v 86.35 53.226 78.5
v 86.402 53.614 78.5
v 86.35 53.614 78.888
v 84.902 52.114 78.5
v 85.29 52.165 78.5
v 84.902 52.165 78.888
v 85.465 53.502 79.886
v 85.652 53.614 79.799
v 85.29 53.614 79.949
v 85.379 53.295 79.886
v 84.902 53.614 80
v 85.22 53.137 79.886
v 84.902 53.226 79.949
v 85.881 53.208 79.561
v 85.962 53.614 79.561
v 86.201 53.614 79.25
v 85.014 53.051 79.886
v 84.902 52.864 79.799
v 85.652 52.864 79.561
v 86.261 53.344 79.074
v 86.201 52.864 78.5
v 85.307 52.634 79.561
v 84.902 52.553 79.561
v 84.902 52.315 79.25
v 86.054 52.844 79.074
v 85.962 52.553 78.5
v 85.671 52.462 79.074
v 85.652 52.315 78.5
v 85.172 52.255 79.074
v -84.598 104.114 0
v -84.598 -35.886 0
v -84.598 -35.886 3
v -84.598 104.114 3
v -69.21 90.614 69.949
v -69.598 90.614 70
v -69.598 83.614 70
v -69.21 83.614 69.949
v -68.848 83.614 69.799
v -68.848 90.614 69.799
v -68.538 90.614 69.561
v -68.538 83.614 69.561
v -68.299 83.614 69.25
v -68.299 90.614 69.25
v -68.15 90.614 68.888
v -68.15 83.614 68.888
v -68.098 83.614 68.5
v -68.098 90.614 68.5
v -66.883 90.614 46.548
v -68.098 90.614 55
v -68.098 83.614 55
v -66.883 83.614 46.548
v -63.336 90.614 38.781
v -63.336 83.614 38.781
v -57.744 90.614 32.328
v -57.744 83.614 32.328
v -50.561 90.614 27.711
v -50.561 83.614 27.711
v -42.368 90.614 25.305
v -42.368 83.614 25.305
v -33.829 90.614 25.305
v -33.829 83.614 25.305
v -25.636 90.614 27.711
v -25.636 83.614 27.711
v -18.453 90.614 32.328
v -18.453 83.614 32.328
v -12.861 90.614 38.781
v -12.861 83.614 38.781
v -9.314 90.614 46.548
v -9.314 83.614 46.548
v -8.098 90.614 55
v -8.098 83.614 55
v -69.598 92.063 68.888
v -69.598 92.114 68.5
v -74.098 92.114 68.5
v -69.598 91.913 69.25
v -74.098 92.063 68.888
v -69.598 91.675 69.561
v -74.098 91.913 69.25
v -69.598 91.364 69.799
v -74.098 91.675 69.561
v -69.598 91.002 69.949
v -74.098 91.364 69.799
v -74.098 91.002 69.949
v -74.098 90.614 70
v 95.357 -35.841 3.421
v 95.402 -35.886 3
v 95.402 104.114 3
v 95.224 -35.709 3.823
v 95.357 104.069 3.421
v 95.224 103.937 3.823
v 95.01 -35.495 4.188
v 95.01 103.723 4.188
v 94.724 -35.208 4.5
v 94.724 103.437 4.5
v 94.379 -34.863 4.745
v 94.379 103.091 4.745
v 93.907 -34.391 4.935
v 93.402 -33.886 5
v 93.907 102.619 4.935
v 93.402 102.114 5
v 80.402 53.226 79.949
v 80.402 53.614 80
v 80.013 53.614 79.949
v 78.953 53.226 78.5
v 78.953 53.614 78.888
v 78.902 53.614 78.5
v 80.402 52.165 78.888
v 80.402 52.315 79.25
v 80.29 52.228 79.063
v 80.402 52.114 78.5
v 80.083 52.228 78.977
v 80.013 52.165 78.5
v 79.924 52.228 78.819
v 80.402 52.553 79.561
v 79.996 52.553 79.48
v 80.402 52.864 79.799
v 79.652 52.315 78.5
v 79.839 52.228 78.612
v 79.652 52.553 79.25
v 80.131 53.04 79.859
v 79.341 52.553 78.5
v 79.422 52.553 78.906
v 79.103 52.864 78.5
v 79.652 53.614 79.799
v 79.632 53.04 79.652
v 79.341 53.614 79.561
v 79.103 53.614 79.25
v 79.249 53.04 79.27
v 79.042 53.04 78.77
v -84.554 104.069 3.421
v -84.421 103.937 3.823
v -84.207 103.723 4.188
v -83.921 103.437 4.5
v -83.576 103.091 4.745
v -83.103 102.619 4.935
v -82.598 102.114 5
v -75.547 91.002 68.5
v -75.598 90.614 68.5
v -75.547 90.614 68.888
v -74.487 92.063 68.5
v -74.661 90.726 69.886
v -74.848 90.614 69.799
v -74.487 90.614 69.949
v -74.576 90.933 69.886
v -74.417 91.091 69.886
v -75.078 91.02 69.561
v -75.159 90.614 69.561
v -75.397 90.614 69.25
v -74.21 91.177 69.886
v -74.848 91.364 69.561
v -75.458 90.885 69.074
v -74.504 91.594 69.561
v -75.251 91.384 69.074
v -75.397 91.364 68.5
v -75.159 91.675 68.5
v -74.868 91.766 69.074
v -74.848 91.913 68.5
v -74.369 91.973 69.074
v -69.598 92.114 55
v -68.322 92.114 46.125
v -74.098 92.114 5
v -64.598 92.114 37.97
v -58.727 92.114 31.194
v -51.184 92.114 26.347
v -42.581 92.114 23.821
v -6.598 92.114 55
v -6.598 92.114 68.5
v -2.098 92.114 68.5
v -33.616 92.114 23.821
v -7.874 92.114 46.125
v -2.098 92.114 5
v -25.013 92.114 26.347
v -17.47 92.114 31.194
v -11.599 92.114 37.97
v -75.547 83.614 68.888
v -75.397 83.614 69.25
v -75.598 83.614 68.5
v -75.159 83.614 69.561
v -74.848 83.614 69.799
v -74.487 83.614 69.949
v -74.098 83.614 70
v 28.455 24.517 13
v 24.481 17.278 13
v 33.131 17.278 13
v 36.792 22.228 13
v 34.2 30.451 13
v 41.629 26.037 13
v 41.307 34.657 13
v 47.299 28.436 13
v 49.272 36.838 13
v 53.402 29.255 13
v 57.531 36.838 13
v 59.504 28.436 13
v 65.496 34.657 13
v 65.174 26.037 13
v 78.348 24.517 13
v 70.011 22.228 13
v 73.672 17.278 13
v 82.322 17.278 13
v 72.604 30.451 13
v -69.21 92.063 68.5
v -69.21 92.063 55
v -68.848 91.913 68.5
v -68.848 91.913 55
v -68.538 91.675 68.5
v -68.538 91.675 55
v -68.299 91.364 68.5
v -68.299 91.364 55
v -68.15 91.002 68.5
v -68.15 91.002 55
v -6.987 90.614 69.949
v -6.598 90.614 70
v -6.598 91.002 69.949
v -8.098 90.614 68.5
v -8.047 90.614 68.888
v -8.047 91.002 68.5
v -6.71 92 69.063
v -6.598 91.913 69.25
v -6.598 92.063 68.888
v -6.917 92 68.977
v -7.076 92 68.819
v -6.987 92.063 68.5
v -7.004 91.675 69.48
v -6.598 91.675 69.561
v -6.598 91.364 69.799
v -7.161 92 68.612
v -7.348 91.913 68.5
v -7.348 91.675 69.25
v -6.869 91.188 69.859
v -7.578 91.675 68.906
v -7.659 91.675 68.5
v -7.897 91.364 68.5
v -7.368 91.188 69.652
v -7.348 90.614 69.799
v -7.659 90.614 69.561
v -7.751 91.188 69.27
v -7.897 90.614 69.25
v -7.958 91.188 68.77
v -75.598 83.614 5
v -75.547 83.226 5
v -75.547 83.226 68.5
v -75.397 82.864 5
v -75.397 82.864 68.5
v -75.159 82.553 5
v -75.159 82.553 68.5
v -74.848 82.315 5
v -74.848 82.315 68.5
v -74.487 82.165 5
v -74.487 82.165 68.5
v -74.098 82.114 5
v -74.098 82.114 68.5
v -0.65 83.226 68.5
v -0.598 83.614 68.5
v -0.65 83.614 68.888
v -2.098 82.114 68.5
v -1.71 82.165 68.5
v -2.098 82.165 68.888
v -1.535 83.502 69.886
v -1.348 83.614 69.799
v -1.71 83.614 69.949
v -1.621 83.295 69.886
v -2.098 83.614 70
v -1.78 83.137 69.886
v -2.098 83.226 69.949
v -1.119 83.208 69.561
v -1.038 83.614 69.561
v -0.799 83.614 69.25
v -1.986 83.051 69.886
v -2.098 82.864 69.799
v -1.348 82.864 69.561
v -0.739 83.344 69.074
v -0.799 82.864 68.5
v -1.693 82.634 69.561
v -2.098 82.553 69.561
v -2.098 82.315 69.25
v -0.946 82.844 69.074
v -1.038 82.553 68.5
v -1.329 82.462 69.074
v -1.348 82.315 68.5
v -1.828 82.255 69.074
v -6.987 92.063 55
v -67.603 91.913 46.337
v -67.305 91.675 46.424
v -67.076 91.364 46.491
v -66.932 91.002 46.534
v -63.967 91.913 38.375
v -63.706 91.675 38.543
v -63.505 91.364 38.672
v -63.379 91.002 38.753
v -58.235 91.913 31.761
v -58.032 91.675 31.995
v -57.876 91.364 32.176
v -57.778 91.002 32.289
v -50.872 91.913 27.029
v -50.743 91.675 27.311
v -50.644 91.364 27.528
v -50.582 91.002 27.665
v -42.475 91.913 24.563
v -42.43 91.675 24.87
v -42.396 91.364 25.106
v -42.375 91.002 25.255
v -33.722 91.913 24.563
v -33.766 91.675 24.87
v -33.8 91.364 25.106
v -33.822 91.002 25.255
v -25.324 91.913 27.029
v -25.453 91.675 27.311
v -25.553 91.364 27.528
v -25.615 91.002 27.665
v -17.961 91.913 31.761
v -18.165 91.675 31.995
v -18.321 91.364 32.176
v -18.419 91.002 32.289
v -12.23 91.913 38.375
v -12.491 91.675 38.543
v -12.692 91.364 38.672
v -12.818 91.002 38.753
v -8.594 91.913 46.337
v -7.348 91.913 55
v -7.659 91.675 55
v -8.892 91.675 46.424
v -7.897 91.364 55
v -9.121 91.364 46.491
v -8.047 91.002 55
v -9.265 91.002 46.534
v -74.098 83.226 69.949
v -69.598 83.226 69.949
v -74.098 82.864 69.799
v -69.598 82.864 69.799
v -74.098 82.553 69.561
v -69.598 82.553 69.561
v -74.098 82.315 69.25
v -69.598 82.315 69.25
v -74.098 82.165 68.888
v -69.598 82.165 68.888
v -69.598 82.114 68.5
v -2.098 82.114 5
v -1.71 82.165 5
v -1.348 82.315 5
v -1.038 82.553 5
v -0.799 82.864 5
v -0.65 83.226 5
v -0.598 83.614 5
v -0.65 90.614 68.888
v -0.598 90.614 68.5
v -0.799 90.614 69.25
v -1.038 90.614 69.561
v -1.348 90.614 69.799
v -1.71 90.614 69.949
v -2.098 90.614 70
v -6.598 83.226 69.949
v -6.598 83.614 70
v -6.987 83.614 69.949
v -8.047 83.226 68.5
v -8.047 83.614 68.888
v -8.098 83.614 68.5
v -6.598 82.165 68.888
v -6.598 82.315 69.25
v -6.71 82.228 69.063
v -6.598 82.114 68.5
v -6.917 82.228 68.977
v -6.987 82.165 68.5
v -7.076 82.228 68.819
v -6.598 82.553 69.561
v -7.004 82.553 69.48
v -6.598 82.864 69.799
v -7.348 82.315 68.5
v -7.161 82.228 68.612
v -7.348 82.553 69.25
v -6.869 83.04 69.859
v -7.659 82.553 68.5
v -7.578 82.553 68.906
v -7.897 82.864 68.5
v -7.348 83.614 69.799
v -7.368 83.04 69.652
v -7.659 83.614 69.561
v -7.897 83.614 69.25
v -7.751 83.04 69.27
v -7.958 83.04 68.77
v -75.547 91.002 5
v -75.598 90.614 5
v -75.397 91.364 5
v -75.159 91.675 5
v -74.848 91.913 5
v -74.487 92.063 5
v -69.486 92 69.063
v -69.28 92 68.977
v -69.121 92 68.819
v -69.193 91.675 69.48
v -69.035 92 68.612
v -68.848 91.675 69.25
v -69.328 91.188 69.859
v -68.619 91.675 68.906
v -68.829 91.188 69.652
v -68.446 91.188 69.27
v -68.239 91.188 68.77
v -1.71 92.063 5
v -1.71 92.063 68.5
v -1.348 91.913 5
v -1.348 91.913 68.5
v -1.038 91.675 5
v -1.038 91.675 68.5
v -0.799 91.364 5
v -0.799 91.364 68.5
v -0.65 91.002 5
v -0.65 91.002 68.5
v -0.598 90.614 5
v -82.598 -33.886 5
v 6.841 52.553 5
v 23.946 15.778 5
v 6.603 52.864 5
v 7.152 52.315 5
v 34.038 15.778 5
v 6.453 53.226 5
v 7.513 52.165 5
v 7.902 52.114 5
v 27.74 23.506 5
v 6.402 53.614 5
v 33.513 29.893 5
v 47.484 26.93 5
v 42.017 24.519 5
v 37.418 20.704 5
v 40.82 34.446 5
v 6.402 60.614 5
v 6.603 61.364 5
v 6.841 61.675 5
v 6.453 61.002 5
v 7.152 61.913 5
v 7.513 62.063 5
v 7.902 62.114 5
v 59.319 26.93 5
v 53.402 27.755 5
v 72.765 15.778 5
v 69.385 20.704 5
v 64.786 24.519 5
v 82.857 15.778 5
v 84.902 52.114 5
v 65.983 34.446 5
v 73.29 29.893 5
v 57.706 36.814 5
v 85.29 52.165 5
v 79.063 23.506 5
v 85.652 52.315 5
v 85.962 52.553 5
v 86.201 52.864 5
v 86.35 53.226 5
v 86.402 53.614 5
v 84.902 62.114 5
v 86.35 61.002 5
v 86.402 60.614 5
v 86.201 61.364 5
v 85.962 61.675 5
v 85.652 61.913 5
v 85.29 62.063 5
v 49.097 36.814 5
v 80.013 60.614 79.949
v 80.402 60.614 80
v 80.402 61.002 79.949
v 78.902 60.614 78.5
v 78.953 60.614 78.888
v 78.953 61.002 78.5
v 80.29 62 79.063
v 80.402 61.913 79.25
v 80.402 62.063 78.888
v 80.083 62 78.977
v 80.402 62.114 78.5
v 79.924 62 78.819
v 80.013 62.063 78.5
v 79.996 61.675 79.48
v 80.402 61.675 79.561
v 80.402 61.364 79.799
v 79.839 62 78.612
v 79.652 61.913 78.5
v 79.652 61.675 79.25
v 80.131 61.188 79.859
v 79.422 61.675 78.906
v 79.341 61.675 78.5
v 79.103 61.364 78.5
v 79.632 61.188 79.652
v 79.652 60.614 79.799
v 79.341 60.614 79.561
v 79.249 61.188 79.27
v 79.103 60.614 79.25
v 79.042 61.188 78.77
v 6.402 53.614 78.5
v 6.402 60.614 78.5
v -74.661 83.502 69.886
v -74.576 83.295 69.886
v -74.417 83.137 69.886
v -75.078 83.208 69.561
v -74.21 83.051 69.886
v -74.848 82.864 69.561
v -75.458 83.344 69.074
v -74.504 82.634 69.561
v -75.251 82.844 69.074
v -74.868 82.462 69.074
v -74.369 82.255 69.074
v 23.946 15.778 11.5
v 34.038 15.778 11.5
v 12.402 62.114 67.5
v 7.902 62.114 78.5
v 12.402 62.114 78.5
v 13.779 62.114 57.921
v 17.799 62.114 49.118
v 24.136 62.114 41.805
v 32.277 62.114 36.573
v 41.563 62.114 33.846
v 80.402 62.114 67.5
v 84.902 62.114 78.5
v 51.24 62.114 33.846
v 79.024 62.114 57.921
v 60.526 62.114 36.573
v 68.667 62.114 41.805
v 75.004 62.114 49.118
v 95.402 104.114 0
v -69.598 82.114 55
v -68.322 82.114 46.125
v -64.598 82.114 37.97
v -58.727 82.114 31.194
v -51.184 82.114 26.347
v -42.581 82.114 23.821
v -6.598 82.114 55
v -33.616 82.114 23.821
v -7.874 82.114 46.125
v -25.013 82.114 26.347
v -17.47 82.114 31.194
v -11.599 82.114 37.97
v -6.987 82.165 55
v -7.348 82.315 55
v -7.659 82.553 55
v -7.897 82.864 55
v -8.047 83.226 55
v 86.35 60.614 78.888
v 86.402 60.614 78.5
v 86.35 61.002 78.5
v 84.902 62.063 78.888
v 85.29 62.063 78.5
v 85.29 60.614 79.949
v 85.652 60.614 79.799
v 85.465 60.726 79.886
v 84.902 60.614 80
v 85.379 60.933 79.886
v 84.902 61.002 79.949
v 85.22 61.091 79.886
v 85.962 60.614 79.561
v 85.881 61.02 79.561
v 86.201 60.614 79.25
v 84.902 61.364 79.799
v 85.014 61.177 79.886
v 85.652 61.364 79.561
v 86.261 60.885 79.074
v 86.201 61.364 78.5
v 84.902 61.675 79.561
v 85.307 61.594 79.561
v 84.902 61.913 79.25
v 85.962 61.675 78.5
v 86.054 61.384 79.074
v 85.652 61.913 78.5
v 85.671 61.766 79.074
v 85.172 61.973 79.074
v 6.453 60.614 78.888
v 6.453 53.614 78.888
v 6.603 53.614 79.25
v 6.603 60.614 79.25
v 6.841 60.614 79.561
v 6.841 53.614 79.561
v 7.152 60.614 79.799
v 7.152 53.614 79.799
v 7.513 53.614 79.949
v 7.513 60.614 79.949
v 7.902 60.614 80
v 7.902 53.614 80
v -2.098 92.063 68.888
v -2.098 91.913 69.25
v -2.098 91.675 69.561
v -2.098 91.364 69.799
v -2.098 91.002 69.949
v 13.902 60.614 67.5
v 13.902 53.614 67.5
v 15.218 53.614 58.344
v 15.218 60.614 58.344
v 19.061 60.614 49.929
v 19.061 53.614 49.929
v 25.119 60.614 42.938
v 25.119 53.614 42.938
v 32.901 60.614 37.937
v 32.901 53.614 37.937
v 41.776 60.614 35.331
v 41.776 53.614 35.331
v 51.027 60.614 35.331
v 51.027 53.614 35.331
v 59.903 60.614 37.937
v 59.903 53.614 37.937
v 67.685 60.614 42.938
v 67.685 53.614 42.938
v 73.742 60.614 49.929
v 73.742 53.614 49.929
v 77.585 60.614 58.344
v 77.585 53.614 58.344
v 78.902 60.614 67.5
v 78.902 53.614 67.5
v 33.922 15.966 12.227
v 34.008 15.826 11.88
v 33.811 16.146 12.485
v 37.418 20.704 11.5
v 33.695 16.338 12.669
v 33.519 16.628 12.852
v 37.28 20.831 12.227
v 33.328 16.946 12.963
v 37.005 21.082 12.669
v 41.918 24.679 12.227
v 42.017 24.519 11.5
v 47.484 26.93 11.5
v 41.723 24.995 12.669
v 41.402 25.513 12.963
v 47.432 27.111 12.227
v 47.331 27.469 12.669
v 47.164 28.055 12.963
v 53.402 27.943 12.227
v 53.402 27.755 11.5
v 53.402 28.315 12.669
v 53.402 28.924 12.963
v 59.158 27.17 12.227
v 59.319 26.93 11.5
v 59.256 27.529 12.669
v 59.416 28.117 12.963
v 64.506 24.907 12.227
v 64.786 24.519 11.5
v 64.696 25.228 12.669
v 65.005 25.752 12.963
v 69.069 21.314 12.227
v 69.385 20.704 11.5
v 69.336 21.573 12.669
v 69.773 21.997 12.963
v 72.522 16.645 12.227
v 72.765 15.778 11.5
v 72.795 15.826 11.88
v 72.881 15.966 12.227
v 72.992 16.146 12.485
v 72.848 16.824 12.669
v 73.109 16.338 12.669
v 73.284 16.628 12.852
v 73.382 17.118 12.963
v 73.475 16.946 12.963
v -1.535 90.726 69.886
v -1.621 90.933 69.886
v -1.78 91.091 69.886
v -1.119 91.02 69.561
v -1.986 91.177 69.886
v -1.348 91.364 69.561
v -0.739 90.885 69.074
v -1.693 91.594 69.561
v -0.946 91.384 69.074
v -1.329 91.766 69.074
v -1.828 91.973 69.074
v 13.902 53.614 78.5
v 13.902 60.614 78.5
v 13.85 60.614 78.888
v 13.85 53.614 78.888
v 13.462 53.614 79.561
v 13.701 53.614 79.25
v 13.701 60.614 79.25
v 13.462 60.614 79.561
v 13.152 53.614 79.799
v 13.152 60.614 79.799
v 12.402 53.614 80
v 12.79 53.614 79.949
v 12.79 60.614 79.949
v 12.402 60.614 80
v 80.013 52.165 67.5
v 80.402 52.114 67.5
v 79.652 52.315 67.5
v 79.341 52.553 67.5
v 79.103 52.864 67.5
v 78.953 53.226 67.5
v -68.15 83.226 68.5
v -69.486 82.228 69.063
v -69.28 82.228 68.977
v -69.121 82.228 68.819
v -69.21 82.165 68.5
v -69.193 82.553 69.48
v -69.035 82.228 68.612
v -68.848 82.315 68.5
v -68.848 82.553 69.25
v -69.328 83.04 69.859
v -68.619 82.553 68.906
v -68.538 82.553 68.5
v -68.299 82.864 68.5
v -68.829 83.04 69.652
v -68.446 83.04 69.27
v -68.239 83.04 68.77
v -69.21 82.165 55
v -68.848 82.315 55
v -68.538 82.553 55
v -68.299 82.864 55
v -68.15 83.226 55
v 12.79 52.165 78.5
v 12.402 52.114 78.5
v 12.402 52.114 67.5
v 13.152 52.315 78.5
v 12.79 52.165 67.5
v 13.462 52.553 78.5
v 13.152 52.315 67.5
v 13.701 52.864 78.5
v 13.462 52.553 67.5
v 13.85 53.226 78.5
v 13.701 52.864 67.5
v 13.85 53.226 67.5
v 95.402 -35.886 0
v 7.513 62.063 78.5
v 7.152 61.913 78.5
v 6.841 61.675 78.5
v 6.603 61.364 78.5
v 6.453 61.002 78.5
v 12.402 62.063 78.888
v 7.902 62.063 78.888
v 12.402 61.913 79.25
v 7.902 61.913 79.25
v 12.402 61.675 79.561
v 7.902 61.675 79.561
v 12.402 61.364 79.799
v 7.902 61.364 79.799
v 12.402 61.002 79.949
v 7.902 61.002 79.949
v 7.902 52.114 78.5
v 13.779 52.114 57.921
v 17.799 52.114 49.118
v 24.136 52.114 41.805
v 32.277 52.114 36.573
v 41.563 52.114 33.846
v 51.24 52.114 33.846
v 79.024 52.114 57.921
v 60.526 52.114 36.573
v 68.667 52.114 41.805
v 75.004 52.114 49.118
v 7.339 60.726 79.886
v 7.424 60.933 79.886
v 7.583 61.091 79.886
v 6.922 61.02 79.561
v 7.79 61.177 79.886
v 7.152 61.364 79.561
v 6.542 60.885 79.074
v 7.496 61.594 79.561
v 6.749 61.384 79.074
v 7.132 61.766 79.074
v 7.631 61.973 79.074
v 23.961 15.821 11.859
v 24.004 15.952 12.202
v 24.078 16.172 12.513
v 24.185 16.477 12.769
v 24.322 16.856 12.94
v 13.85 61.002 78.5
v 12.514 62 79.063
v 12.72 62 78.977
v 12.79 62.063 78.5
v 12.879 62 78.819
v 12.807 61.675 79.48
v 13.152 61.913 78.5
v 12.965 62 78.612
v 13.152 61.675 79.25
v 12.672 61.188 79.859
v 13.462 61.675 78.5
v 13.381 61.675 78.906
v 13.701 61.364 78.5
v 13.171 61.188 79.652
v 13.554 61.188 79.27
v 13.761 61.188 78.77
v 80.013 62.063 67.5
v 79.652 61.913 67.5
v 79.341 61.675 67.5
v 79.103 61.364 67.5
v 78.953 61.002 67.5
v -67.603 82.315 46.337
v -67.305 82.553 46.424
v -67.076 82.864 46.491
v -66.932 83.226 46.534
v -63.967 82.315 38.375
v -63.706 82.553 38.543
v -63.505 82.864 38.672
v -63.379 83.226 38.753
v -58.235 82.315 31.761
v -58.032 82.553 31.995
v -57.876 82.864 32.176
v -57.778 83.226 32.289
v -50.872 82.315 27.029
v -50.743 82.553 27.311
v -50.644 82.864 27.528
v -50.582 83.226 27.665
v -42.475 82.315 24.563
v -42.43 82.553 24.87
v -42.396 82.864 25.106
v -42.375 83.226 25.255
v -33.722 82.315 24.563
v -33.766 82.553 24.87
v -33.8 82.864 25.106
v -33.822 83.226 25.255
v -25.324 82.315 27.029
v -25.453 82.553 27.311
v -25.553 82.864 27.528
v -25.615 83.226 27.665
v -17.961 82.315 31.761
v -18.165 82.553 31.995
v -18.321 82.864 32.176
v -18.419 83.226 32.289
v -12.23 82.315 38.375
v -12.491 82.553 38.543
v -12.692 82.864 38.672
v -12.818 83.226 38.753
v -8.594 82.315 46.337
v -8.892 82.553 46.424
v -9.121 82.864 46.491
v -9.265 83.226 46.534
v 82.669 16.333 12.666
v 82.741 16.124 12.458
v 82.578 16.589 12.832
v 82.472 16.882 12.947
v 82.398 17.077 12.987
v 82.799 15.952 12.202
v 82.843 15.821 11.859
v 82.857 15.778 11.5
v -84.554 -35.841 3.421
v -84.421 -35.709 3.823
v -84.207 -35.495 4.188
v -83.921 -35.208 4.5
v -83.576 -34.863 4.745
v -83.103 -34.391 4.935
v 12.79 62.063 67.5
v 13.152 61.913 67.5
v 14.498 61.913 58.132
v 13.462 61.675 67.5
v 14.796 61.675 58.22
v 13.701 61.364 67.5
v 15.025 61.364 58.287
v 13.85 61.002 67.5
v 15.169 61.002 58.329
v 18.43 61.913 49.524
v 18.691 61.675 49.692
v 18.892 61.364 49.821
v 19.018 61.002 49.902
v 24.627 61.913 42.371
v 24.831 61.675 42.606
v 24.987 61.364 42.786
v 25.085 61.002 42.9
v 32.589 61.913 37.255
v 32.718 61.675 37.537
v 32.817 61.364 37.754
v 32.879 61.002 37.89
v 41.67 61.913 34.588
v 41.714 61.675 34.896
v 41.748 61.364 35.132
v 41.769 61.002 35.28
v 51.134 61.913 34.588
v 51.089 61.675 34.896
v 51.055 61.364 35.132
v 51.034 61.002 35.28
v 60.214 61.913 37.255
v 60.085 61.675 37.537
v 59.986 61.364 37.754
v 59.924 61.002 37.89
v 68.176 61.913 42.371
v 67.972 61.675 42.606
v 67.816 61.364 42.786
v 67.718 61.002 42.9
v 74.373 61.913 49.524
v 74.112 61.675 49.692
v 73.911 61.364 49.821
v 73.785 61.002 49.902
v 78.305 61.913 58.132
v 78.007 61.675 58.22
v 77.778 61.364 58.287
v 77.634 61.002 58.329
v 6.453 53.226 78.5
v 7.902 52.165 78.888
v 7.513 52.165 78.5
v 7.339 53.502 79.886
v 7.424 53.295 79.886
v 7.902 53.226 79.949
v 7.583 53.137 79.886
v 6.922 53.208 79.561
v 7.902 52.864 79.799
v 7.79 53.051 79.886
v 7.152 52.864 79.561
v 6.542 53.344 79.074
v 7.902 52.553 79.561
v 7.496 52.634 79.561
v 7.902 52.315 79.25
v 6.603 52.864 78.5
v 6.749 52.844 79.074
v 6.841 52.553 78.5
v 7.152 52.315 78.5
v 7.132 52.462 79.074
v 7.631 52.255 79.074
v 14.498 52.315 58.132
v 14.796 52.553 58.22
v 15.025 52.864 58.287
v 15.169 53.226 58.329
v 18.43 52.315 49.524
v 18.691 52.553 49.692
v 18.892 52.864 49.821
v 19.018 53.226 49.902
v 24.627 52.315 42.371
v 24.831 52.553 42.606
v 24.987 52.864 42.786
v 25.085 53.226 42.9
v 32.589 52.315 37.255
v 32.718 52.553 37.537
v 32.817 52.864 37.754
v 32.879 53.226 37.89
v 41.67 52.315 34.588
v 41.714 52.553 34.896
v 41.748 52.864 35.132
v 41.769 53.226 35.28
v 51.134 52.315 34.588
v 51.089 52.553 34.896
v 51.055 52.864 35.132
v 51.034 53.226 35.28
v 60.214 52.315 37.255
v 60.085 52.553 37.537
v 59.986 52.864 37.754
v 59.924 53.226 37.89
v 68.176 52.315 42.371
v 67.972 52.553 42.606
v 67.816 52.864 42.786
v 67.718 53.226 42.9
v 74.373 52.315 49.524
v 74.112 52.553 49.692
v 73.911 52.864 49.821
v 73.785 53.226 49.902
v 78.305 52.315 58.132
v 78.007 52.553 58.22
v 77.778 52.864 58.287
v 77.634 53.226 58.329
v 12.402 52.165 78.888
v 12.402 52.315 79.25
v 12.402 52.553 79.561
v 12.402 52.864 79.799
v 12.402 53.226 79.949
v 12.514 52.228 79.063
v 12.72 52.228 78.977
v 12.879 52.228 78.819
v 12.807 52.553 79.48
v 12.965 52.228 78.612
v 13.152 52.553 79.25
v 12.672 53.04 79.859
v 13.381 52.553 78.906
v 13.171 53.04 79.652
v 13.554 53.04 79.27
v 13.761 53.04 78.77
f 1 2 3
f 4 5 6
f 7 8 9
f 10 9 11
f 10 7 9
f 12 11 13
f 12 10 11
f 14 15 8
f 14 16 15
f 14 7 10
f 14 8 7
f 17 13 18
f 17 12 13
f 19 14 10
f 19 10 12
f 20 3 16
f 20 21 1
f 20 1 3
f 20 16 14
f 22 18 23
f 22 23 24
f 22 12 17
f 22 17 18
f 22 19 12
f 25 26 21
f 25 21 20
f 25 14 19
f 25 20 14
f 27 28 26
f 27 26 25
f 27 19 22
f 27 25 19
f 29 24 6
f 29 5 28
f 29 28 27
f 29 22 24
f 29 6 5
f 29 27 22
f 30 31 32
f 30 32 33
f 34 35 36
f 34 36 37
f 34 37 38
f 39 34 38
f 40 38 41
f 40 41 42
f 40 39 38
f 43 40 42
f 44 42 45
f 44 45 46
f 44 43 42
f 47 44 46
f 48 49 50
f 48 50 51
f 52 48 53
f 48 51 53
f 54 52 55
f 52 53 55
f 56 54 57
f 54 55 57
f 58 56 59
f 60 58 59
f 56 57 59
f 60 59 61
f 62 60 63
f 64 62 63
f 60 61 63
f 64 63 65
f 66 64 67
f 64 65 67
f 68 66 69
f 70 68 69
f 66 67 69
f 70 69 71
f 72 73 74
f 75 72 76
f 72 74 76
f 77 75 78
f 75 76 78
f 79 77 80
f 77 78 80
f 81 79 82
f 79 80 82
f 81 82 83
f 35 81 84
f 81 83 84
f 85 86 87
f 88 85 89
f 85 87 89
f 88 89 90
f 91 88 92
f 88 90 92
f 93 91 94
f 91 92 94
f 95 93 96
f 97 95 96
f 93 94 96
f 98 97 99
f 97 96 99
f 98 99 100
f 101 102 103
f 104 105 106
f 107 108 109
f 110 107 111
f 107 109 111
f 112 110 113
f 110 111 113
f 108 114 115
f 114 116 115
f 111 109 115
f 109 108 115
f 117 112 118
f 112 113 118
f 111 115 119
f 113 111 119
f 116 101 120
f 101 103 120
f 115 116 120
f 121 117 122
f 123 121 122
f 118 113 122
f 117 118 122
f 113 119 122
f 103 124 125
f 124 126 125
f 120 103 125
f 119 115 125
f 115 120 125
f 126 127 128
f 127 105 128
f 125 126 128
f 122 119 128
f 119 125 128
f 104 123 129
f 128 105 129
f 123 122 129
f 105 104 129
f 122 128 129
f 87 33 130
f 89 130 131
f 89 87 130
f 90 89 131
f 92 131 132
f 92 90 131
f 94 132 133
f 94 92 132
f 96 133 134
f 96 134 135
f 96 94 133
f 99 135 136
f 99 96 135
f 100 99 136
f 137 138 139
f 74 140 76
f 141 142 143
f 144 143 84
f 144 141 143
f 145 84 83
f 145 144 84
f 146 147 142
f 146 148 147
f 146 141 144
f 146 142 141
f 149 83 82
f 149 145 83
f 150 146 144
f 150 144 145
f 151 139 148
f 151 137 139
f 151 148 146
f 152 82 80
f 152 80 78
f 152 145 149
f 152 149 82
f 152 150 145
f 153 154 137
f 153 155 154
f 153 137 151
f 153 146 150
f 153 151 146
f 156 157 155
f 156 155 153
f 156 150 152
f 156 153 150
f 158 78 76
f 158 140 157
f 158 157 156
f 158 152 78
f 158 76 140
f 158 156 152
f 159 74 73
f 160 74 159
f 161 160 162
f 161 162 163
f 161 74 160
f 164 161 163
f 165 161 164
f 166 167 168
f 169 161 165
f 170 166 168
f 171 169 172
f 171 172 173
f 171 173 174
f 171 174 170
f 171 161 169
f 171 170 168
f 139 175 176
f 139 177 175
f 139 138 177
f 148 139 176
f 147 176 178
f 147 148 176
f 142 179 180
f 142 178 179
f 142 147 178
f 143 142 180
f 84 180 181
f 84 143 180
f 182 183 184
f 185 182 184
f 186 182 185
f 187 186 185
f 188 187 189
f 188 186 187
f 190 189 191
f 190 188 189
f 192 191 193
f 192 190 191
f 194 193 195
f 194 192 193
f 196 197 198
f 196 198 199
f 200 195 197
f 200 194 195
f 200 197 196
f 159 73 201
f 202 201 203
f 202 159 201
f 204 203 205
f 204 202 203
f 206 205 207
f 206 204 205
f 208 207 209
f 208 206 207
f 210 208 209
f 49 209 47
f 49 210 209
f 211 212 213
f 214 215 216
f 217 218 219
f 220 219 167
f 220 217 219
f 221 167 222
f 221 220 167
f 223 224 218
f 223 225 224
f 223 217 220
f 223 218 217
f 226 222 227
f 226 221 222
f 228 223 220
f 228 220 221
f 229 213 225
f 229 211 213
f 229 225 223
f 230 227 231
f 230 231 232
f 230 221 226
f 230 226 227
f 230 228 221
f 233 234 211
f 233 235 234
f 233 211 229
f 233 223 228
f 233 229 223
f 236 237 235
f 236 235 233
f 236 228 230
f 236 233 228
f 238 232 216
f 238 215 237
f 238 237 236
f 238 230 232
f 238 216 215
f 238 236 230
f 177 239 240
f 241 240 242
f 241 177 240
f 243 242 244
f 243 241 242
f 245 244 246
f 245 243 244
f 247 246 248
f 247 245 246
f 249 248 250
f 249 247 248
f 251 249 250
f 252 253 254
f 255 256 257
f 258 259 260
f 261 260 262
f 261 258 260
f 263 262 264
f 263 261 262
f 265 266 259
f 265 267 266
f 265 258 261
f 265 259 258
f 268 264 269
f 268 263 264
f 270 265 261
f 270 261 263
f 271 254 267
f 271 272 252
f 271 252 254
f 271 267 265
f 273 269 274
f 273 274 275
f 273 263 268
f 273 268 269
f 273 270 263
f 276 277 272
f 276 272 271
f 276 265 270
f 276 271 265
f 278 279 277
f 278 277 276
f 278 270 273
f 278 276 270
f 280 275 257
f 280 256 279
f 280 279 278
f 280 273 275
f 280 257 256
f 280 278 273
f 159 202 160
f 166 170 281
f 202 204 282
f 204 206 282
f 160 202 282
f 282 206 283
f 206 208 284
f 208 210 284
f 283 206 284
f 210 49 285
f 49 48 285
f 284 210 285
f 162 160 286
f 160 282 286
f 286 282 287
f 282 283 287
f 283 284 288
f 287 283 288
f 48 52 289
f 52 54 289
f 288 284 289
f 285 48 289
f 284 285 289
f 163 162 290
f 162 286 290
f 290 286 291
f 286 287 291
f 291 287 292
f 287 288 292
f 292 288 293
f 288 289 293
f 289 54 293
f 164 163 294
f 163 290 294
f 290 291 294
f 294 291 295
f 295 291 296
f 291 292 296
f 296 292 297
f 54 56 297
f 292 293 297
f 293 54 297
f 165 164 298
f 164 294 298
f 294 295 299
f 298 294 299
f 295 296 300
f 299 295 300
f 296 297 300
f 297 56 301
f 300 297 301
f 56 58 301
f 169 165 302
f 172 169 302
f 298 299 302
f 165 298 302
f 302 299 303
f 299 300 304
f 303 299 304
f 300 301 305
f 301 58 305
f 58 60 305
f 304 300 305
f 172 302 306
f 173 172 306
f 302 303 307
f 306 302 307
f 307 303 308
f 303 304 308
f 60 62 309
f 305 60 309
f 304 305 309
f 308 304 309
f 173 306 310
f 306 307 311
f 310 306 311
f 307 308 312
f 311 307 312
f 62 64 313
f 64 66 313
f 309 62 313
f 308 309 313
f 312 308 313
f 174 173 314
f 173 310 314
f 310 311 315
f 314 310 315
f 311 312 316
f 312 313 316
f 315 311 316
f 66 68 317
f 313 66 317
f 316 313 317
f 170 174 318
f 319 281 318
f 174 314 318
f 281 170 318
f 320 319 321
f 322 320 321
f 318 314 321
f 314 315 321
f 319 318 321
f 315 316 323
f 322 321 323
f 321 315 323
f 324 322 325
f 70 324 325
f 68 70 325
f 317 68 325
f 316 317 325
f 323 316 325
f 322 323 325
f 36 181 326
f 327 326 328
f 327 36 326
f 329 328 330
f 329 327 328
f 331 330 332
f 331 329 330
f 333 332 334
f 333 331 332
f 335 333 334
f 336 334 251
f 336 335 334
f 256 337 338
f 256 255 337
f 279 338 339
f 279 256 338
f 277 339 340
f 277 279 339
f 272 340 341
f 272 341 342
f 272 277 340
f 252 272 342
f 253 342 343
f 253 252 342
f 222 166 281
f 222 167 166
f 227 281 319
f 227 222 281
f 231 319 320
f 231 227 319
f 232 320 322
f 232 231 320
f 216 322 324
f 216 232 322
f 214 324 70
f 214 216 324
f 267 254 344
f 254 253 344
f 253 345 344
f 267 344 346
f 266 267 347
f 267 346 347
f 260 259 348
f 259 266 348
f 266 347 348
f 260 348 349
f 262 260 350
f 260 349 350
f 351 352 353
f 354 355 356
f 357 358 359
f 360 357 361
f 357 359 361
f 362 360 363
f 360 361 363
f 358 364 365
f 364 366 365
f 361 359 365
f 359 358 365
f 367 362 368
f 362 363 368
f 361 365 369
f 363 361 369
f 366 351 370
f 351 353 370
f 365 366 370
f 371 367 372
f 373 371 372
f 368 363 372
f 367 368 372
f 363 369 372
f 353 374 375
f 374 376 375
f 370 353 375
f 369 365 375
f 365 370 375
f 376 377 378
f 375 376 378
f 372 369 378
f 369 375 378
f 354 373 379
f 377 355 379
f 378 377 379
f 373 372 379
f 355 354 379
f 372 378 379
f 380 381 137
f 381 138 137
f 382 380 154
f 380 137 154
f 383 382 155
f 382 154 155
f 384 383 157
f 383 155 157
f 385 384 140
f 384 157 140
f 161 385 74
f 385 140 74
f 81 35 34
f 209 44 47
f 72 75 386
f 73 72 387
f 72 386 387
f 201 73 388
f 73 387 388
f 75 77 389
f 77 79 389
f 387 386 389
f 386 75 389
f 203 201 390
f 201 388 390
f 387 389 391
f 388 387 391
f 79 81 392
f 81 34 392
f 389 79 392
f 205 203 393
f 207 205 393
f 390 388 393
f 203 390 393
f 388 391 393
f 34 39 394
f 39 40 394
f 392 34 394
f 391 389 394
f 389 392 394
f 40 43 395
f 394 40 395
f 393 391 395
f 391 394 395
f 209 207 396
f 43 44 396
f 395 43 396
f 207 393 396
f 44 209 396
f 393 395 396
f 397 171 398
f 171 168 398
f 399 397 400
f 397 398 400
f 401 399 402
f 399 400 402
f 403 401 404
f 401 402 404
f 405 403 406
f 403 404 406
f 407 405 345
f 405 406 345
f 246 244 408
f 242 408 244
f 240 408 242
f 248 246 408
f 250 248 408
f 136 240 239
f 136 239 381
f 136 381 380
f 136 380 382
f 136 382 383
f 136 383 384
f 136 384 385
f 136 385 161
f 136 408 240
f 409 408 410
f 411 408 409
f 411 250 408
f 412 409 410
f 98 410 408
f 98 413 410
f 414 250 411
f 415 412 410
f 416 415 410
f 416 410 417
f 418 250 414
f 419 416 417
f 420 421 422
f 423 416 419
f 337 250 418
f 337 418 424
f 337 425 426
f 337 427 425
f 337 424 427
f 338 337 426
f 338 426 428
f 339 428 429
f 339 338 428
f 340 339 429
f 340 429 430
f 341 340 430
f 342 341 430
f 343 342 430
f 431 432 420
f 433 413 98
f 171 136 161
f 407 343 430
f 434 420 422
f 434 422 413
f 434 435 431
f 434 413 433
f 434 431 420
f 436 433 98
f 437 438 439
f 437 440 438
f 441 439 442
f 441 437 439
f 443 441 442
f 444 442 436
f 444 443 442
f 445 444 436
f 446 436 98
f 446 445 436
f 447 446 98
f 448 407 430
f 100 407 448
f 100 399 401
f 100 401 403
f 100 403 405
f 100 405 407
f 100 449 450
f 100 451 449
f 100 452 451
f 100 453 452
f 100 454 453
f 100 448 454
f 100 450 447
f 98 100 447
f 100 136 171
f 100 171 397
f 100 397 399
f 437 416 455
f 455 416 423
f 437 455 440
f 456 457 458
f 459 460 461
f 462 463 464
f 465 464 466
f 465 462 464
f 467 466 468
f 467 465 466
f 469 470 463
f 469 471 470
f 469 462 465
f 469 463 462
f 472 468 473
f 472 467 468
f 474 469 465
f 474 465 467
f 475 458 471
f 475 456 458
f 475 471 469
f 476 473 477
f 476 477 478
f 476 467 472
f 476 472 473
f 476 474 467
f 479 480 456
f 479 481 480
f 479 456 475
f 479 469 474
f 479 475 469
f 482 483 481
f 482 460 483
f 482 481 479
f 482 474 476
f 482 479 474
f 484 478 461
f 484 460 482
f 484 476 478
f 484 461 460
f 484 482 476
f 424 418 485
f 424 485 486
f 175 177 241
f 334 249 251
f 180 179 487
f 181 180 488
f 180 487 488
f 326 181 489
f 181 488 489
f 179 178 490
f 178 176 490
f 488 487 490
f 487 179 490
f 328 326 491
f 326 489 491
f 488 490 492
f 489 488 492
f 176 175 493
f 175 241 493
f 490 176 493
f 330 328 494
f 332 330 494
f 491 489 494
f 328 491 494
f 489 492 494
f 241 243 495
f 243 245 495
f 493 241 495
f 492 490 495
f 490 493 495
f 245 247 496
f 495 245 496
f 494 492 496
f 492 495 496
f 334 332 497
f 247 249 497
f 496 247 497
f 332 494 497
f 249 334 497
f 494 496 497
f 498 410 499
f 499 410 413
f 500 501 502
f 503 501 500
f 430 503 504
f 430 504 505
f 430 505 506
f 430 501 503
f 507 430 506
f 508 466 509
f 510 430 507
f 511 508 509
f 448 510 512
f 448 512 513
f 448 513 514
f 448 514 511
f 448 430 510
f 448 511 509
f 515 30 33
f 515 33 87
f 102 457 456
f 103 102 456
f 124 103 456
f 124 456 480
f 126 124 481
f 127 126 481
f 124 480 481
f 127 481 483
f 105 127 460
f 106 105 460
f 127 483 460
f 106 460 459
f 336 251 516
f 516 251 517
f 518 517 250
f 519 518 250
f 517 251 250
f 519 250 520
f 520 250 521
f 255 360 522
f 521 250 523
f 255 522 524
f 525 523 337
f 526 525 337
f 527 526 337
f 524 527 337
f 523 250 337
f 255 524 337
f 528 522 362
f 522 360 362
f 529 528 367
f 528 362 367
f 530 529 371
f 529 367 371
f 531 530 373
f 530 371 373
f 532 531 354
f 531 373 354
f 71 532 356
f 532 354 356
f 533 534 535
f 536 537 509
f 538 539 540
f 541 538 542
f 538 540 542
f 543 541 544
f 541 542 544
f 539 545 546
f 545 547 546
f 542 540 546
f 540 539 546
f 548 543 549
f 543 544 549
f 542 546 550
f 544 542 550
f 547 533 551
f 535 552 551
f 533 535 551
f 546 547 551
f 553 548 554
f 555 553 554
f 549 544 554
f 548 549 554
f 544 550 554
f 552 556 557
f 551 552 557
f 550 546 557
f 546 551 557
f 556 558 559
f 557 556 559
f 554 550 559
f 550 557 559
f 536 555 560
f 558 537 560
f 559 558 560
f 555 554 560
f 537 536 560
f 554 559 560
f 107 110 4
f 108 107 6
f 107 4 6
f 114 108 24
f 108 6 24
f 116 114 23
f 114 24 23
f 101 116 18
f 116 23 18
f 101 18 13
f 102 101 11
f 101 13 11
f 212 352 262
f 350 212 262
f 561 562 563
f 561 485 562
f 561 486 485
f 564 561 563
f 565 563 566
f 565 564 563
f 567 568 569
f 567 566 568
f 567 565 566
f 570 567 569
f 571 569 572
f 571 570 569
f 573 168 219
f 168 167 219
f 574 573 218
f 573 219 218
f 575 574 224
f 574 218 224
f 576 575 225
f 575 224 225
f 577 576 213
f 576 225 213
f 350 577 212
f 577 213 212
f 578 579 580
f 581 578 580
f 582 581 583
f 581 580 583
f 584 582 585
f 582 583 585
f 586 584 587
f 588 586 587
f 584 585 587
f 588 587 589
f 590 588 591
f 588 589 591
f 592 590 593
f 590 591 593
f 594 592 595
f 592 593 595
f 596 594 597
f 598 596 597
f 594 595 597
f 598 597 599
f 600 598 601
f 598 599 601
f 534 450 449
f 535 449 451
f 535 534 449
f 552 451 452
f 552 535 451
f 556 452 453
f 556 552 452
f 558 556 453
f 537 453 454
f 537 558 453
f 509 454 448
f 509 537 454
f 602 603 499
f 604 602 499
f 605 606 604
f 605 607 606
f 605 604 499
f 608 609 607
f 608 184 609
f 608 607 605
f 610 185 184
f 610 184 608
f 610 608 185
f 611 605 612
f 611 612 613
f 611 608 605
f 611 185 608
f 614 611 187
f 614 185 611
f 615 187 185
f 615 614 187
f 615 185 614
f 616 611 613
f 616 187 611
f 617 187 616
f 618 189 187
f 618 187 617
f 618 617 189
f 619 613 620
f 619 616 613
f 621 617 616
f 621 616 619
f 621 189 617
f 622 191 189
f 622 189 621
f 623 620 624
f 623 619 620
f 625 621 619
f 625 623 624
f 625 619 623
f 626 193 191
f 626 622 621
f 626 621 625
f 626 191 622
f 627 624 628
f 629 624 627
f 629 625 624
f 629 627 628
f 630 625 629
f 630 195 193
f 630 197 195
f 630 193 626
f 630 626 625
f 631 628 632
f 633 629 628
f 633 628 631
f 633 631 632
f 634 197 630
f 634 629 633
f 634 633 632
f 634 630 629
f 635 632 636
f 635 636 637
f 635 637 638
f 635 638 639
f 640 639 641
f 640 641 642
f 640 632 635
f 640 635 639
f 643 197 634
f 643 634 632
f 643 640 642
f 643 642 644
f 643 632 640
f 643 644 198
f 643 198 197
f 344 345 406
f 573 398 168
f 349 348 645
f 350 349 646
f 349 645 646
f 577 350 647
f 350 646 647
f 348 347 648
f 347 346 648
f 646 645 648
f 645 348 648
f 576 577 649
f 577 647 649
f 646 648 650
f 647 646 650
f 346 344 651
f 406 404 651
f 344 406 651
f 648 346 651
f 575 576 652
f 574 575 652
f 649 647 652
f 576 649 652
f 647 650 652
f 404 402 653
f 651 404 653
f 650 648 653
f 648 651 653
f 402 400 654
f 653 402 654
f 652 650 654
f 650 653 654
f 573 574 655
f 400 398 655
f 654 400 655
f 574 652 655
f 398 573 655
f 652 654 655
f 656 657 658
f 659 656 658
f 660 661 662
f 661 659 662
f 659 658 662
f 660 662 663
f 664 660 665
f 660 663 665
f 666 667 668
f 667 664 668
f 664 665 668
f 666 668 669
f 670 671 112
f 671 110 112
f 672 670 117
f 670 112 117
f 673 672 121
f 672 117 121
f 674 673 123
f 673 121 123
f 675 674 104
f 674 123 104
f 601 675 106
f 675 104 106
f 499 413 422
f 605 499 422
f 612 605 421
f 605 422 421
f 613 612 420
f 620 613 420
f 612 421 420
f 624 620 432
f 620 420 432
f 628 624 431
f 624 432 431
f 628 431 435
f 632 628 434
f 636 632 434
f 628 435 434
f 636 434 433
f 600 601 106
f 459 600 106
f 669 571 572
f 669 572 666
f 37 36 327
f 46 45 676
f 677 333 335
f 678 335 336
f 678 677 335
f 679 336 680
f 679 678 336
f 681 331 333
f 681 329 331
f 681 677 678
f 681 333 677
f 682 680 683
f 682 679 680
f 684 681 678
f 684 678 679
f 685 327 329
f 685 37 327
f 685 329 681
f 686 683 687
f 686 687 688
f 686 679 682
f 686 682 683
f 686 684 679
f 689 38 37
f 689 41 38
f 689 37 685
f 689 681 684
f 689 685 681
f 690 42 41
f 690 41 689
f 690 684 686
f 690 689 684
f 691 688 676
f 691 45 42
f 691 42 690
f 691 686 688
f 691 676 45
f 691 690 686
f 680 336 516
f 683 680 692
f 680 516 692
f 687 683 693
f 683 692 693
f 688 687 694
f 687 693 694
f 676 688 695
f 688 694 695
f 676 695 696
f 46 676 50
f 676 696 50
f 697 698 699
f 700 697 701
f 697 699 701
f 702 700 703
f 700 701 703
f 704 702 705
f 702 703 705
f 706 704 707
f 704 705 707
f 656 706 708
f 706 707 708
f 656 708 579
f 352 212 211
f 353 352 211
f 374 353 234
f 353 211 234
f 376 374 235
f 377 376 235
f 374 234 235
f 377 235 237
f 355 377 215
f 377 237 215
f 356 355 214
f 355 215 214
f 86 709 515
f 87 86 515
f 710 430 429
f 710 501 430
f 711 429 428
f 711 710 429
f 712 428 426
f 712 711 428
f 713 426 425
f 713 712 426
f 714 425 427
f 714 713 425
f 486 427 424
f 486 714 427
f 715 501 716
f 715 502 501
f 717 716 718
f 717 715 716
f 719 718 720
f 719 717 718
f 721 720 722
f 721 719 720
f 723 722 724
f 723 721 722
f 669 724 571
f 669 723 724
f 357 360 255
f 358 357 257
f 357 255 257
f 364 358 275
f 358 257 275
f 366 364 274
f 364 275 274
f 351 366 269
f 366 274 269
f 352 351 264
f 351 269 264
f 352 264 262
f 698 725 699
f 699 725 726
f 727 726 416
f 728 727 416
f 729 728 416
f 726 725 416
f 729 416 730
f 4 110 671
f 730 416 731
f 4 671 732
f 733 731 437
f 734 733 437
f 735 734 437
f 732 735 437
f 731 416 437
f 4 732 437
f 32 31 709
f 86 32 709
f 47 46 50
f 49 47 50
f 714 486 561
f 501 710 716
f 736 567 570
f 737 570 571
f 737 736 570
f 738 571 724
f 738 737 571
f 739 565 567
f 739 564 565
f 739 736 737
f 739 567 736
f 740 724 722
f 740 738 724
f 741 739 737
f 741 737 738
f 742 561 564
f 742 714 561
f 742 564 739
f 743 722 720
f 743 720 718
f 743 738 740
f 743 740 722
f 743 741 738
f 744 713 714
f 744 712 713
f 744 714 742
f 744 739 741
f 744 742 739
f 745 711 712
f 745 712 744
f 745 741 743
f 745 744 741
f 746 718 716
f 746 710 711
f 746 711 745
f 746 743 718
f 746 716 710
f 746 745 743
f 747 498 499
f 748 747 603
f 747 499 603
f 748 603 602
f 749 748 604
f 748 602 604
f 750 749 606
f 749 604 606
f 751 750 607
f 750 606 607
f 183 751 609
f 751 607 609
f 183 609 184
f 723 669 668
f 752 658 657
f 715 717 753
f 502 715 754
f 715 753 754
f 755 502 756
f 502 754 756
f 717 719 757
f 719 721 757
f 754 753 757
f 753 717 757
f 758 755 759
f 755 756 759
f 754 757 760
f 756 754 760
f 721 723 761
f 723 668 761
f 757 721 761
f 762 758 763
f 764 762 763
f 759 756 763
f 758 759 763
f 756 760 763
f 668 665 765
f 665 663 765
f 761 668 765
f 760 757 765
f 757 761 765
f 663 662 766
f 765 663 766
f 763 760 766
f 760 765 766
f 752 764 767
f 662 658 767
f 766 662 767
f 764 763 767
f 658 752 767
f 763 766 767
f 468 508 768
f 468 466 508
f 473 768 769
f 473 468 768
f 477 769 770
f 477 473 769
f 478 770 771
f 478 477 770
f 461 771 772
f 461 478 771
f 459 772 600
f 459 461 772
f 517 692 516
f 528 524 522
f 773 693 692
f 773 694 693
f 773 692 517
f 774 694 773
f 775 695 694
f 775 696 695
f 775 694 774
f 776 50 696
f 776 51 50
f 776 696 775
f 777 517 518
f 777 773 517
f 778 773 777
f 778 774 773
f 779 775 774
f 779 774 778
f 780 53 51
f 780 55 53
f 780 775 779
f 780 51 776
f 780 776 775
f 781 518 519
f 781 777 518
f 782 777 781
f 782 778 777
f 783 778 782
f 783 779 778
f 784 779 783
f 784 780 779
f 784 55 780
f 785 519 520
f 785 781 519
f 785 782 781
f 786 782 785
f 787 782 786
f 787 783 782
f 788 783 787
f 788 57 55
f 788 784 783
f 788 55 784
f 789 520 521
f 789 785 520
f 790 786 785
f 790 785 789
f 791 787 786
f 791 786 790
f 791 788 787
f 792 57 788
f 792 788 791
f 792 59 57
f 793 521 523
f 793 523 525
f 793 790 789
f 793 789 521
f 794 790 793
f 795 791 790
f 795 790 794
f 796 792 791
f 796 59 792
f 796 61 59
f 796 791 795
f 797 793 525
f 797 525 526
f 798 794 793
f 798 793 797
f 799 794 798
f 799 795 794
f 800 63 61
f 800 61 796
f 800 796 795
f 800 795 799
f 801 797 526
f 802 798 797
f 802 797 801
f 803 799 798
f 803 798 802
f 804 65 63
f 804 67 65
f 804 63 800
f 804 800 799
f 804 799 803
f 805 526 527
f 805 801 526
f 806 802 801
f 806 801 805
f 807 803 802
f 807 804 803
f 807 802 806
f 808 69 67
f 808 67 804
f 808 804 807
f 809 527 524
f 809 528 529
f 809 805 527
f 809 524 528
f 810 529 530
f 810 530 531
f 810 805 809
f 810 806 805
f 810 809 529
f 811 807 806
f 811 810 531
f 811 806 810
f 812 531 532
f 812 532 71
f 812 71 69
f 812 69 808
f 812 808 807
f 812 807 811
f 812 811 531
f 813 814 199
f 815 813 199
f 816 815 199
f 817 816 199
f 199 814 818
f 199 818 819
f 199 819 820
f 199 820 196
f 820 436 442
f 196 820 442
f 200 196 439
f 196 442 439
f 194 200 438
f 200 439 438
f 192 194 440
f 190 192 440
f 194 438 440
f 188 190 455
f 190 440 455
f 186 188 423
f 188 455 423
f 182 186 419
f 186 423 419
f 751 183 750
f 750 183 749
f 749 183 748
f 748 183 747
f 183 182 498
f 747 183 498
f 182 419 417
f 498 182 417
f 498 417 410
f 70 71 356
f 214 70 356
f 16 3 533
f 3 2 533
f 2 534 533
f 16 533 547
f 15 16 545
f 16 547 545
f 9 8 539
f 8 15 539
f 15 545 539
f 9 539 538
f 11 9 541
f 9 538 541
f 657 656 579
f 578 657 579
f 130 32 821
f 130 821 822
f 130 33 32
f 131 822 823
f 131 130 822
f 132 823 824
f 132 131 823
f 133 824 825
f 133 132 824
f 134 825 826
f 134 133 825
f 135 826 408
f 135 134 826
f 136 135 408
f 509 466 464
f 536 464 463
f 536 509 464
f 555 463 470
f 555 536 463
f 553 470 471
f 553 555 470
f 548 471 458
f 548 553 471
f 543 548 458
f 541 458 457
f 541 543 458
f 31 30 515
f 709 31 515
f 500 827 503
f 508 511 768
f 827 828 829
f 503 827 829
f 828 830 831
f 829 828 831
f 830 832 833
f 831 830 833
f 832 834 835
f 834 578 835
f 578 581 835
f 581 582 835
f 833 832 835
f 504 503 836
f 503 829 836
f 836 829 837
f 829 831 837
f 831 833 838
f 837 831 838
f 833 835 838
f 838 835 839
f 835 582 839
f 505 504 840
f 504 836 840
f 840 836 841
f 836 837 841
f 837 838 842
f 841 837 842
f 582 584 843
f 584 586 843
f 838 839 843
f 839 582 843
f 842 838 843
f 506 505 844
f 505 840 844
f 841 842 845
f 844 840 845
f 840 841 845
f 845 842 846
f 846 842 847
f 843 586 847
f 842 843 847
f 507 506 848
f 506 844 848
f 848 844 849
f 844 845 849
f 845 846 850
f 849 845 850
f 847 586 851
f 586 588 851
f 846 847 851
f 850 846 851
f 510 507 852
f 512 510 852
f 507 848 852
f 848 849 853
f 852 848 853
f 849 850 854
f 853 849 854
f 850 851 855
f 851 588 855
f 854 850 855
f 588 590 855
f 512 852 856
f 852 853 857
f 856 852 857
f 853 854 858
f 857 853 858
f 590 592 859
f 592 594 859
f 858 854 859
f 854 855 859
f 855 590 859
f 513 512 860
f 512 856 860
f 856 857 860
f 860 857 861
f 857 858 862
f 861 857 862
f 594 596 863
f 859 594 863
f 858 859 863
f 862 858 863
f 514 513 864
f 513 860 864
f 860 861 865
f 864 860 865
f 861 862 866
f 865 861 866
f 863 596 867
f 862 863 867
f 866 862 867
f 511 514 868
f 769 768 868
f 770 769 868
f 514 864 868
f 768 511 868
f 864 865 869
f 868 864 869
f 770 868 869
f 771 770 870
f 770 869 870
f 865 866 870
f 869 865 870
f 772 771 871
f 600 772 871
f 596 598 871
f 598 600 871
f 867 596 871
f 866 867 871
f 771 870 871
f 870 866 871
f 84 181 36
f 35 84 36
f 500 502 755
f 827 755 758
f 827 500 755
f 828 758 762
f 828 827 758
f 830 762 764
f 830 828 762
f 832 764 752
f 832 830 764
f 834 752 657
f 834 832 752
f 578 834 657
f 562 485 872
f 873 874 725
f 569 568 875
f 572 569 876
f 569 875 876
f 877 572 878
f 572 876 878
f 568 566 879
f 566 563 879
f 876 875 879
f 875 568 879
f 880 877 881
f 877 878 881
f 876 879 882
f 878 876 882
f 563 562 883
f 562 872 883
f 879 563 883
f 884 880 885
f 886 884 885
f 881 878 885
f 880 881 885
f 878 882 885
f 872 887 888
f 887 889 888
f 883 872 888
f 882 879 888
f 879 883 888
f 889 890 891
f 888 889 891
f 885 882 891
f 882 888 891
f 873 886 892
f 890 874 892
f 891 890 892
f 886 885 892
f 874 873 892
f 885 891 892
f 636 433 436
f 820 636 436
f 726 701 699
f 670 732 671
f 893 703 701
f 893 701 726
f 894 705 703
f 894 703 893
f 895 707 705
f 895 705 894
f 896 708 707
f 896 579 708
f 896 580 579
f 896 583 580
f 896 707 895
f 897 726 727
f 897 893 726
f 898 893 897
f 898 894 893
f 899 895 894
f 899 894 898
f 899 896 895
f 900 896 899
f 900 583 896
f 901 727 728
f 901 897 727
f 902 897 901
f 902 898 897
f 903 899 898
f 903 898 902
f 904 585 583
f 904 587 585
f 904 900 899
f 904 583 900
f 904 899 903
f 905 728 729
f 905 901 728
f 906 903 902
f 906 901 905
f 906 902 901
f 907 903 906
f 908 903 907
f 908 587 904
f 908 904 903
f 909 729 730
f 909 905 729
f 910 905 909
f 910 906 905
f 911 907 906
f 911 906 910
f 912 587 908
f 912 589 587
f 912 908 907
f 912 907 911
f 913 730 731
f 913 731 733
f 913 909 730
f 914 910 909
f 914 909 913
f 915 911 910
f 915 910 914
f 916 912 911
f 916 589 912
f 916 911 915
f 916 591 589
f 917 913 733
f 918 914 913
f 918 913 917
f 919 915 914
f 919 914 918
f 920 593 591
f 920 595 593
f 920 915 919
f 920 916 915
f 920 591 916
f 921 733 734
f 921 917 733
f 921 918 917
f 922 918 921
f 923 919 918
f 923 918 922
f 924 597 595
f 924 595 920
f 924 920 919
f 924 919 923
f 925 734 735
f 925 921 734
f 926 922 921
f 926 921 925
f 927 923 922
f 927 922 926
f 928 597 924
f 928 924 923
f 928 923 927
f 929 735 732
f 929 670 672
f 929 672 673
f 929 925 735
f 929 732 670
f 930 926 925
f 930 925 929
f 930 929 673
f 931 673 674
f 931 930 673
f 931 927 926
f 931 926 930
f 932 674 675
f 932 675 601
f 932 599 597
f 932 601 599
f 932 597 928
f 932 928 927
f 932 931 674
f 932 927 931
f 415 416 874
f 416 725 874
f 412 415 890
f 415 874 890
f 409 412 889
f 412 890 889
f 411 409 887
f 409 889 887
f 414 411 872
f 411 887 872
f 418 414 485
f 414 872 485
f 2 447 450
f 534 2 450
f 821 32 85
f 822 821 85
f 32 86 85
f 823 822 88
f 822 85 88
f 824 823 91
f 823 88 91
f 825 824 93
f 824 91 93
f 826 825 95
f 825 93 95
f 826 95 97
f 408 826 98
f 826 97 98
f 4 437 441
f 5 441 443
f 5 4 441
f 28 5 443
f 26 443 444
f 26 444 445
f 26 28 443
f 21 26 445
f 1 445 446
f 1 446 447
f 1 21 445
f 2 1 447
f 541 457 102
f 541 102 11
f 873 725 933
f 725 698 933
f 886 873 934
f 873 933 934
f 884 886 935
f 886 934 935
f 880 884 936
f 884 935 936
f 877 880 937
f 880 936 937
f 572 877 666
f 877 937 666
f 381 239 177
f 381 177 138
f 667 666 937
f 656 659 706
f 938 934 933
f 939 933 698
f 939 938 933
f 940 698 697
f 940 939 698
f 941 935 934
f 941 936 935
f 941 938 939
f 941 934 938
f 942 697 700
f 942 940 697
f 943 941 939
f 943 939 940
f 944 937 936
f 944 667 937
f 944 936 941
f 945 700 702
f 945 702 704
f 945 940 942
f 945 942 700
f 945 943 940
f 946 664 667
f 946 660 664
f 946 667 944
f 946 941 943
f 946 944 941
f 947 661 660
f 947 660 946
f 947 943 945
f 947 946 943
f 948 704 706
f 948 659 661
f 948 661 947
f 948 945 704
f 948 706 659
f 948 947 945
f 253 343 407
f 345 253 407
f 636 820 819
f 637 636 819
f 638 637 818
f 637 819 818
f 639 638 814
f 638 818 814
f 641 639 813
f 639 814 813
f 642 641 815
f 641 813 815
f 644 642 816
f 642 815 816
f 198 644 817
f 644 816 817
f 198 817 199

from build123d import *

# Parameters (mm, degrees)
F5_W      = 180
F5_H      = 140
F0_DEPTH  = 5
F1_R      = 2
F7_DEPTH  = 8
F8_W      = 75
F8_H      = 10
F8_W_2    = 80
F9_DEPTH  = 75
F10_DEPTH = 75
F11_DEPTH = 25
F4_DEPTH  = 25
F12_R     = 1.5


with BuildPart() as f0:
    # F5 (on Top) → F0 (new body)
    with BuildSketch(Plane.XY):
        with Locations((5.4015538096, 34.1141599765)):
            Rectangle(F5_W, F5_H)
    extrude(amount=F0_DEPTH)

    # F1
    f1_edges = [f0.edges().sort_by_distance(p)[0] for p in [
        (5.401554, -35.88584, 5),
        (95.401554, 34.11416, 5),
        (-84.598446, 34.11416, 5),
        (5.401554, 104.11416, 5),
    ]]
    fillet(f1_edges, radius=F1_R)

    # F6 (on face) → F7 (join)
    with BuildSketch(Plane.XY.offset(5)):
        with BuildLine():
            ThreePointArc((82.8569015917, 15.7776214182), (53.4015538096, 37.1141599765), (23.9462060275, 15.7776214182))
            Line((23.9462060275, 15.7776214182), (34.0379001592, 15.7776214182))
            ThreePointArc((34.0379001592, 15.7776214182), (53.4015538096, 27.7551758891), (72.7652074601, 15.7776214182))
            Line((72.7652074601, 15.7776214182), (82.8569015917, 15.7776214182))
        make_face()
    extrude(amount=F7_DEPTH)

    # F8 (on face) → F9 (join)
    with BuildSketch(Plane.XY.offset(5)):
        with Locations((-38.0984461904, 87.1141599765)):
            Rectangle(F8_W, F8_H)
        with Locations((46.4015538096, 57.1141599765)):
            Rectangle(F8_W_2, F8_H)
    extrude(amount=F9_DEPTH)

    # F8 (on face) → F10 (join)
    with BuildSketch(Plane.XY.offset(5)):
        with Locations((-38.0984461904, 87.1141599765)):
            Rectangle(F8_W, F8_H)
        with Locations((46.4015538096, 57.1141599765)):
            Rectangle(F8_W_2, F8_H)
    extrude(amount=F10_DEPTH)

    # F2 (on face) → F11 (cut)
    with BuildSketch(Plane.XZ.offset(-52.1141599765)):
        with BuildLine():
            Line((13.9015538096, 80), (13.9015538096, 67.5))
            ThreePointArc((13.9015538096, 67.5), (46.4015538096, 35), (78.9015538096, 67.5))
            Line((78.9015538096, 67.5), (78.9015538096, 80))
            Line((78.9015538096, 80), (13.9015538096, 80))
        make_face()
    extrude(amount=-F11_DEPTH, mode=Mode.SUBTRACT)

    # F3 (on face) → F4 (cut)
    with BuildSketch(Plane.XZ.offset(-82.1141599765)):
        with BuildLine():
            Line((-68.0984461904, 70), (-68.0984461904, 55))
            ThreePointArc((-68.0984461904, 55), (-38.0984461904, 25), (-8.0984461904, 55))
            Line((-8.0984461904, 55), (-8.0984461904, 70))
            Line((-8.0984461904, 70), (-0.5984461904, 70))
            Line((-0.5984461904, 70), (-0.5984461904, 80))
            Line((-0.5984461904, 80), (-75.5984461904, 80))
            Line((-75.5984461904, 80), (-75.5984461904, 70))
            Line((-75.5984461904, 70), (-68.0984461904, 70))
        make_face()
    extrude(amount=-F4_DEPTH, mode=Mode.SUBTRACT)

    # F12
    f12_edges = [f0.edges().sort_by_distance(p)[0] for p in [
        (86.401554, 52.11416, 42.5),
        (86.401554, 62.11416, 42.5),
        (78.901554, 57.11416, 80),
        (13.901554, 57.11416, 80),
        (-8.098446, 87.11416, 70),
        (-68.098446, 87.11416, 70),
        (6.401554, 52.11416, 42.5),
        (6.401554, 62.11416, 42.5),
        (-75.598446, 82.11416, 37.5),
        (-75.598446, 92.11416, 37.5),
        (-0.598446, 82.11416, 37.5),
        (-0.598446, 92.11416, 37.5),
        (86.401554, 57.11416, 80),
        (6.401554, 57.11416, 80),
        (-0.598446, 87.11416, 70),
        (-75.598446, 87.11416, 70),
        (10.151554, 52.11416, 80),
        (-4.348446, 82.11416, 70),
        (-71.848446, 92.11416, 70),
        (-4.348446, 92.11416, 70),
        (-71.848446, 82.11416, 70),
        (10.151554, 62.11416, 80),
        (82.651554, 52.11416, 80),
        (46.401554, 52.11416, 35),
        (-38.098446, 82.11416, 25),
        (82.651554, 62.11416, 80),
        (46.401554, 62.11416, 35),
        (-38.098446, 92.11416, 25),
        (53.401554, 27.755176, 13),
        (28.992053, 15.777621, 13),
        (77.811055, 15.777621, 13),
    ]]
    fillet(f12_edges, radius=F12_R)


solid = f0.part
